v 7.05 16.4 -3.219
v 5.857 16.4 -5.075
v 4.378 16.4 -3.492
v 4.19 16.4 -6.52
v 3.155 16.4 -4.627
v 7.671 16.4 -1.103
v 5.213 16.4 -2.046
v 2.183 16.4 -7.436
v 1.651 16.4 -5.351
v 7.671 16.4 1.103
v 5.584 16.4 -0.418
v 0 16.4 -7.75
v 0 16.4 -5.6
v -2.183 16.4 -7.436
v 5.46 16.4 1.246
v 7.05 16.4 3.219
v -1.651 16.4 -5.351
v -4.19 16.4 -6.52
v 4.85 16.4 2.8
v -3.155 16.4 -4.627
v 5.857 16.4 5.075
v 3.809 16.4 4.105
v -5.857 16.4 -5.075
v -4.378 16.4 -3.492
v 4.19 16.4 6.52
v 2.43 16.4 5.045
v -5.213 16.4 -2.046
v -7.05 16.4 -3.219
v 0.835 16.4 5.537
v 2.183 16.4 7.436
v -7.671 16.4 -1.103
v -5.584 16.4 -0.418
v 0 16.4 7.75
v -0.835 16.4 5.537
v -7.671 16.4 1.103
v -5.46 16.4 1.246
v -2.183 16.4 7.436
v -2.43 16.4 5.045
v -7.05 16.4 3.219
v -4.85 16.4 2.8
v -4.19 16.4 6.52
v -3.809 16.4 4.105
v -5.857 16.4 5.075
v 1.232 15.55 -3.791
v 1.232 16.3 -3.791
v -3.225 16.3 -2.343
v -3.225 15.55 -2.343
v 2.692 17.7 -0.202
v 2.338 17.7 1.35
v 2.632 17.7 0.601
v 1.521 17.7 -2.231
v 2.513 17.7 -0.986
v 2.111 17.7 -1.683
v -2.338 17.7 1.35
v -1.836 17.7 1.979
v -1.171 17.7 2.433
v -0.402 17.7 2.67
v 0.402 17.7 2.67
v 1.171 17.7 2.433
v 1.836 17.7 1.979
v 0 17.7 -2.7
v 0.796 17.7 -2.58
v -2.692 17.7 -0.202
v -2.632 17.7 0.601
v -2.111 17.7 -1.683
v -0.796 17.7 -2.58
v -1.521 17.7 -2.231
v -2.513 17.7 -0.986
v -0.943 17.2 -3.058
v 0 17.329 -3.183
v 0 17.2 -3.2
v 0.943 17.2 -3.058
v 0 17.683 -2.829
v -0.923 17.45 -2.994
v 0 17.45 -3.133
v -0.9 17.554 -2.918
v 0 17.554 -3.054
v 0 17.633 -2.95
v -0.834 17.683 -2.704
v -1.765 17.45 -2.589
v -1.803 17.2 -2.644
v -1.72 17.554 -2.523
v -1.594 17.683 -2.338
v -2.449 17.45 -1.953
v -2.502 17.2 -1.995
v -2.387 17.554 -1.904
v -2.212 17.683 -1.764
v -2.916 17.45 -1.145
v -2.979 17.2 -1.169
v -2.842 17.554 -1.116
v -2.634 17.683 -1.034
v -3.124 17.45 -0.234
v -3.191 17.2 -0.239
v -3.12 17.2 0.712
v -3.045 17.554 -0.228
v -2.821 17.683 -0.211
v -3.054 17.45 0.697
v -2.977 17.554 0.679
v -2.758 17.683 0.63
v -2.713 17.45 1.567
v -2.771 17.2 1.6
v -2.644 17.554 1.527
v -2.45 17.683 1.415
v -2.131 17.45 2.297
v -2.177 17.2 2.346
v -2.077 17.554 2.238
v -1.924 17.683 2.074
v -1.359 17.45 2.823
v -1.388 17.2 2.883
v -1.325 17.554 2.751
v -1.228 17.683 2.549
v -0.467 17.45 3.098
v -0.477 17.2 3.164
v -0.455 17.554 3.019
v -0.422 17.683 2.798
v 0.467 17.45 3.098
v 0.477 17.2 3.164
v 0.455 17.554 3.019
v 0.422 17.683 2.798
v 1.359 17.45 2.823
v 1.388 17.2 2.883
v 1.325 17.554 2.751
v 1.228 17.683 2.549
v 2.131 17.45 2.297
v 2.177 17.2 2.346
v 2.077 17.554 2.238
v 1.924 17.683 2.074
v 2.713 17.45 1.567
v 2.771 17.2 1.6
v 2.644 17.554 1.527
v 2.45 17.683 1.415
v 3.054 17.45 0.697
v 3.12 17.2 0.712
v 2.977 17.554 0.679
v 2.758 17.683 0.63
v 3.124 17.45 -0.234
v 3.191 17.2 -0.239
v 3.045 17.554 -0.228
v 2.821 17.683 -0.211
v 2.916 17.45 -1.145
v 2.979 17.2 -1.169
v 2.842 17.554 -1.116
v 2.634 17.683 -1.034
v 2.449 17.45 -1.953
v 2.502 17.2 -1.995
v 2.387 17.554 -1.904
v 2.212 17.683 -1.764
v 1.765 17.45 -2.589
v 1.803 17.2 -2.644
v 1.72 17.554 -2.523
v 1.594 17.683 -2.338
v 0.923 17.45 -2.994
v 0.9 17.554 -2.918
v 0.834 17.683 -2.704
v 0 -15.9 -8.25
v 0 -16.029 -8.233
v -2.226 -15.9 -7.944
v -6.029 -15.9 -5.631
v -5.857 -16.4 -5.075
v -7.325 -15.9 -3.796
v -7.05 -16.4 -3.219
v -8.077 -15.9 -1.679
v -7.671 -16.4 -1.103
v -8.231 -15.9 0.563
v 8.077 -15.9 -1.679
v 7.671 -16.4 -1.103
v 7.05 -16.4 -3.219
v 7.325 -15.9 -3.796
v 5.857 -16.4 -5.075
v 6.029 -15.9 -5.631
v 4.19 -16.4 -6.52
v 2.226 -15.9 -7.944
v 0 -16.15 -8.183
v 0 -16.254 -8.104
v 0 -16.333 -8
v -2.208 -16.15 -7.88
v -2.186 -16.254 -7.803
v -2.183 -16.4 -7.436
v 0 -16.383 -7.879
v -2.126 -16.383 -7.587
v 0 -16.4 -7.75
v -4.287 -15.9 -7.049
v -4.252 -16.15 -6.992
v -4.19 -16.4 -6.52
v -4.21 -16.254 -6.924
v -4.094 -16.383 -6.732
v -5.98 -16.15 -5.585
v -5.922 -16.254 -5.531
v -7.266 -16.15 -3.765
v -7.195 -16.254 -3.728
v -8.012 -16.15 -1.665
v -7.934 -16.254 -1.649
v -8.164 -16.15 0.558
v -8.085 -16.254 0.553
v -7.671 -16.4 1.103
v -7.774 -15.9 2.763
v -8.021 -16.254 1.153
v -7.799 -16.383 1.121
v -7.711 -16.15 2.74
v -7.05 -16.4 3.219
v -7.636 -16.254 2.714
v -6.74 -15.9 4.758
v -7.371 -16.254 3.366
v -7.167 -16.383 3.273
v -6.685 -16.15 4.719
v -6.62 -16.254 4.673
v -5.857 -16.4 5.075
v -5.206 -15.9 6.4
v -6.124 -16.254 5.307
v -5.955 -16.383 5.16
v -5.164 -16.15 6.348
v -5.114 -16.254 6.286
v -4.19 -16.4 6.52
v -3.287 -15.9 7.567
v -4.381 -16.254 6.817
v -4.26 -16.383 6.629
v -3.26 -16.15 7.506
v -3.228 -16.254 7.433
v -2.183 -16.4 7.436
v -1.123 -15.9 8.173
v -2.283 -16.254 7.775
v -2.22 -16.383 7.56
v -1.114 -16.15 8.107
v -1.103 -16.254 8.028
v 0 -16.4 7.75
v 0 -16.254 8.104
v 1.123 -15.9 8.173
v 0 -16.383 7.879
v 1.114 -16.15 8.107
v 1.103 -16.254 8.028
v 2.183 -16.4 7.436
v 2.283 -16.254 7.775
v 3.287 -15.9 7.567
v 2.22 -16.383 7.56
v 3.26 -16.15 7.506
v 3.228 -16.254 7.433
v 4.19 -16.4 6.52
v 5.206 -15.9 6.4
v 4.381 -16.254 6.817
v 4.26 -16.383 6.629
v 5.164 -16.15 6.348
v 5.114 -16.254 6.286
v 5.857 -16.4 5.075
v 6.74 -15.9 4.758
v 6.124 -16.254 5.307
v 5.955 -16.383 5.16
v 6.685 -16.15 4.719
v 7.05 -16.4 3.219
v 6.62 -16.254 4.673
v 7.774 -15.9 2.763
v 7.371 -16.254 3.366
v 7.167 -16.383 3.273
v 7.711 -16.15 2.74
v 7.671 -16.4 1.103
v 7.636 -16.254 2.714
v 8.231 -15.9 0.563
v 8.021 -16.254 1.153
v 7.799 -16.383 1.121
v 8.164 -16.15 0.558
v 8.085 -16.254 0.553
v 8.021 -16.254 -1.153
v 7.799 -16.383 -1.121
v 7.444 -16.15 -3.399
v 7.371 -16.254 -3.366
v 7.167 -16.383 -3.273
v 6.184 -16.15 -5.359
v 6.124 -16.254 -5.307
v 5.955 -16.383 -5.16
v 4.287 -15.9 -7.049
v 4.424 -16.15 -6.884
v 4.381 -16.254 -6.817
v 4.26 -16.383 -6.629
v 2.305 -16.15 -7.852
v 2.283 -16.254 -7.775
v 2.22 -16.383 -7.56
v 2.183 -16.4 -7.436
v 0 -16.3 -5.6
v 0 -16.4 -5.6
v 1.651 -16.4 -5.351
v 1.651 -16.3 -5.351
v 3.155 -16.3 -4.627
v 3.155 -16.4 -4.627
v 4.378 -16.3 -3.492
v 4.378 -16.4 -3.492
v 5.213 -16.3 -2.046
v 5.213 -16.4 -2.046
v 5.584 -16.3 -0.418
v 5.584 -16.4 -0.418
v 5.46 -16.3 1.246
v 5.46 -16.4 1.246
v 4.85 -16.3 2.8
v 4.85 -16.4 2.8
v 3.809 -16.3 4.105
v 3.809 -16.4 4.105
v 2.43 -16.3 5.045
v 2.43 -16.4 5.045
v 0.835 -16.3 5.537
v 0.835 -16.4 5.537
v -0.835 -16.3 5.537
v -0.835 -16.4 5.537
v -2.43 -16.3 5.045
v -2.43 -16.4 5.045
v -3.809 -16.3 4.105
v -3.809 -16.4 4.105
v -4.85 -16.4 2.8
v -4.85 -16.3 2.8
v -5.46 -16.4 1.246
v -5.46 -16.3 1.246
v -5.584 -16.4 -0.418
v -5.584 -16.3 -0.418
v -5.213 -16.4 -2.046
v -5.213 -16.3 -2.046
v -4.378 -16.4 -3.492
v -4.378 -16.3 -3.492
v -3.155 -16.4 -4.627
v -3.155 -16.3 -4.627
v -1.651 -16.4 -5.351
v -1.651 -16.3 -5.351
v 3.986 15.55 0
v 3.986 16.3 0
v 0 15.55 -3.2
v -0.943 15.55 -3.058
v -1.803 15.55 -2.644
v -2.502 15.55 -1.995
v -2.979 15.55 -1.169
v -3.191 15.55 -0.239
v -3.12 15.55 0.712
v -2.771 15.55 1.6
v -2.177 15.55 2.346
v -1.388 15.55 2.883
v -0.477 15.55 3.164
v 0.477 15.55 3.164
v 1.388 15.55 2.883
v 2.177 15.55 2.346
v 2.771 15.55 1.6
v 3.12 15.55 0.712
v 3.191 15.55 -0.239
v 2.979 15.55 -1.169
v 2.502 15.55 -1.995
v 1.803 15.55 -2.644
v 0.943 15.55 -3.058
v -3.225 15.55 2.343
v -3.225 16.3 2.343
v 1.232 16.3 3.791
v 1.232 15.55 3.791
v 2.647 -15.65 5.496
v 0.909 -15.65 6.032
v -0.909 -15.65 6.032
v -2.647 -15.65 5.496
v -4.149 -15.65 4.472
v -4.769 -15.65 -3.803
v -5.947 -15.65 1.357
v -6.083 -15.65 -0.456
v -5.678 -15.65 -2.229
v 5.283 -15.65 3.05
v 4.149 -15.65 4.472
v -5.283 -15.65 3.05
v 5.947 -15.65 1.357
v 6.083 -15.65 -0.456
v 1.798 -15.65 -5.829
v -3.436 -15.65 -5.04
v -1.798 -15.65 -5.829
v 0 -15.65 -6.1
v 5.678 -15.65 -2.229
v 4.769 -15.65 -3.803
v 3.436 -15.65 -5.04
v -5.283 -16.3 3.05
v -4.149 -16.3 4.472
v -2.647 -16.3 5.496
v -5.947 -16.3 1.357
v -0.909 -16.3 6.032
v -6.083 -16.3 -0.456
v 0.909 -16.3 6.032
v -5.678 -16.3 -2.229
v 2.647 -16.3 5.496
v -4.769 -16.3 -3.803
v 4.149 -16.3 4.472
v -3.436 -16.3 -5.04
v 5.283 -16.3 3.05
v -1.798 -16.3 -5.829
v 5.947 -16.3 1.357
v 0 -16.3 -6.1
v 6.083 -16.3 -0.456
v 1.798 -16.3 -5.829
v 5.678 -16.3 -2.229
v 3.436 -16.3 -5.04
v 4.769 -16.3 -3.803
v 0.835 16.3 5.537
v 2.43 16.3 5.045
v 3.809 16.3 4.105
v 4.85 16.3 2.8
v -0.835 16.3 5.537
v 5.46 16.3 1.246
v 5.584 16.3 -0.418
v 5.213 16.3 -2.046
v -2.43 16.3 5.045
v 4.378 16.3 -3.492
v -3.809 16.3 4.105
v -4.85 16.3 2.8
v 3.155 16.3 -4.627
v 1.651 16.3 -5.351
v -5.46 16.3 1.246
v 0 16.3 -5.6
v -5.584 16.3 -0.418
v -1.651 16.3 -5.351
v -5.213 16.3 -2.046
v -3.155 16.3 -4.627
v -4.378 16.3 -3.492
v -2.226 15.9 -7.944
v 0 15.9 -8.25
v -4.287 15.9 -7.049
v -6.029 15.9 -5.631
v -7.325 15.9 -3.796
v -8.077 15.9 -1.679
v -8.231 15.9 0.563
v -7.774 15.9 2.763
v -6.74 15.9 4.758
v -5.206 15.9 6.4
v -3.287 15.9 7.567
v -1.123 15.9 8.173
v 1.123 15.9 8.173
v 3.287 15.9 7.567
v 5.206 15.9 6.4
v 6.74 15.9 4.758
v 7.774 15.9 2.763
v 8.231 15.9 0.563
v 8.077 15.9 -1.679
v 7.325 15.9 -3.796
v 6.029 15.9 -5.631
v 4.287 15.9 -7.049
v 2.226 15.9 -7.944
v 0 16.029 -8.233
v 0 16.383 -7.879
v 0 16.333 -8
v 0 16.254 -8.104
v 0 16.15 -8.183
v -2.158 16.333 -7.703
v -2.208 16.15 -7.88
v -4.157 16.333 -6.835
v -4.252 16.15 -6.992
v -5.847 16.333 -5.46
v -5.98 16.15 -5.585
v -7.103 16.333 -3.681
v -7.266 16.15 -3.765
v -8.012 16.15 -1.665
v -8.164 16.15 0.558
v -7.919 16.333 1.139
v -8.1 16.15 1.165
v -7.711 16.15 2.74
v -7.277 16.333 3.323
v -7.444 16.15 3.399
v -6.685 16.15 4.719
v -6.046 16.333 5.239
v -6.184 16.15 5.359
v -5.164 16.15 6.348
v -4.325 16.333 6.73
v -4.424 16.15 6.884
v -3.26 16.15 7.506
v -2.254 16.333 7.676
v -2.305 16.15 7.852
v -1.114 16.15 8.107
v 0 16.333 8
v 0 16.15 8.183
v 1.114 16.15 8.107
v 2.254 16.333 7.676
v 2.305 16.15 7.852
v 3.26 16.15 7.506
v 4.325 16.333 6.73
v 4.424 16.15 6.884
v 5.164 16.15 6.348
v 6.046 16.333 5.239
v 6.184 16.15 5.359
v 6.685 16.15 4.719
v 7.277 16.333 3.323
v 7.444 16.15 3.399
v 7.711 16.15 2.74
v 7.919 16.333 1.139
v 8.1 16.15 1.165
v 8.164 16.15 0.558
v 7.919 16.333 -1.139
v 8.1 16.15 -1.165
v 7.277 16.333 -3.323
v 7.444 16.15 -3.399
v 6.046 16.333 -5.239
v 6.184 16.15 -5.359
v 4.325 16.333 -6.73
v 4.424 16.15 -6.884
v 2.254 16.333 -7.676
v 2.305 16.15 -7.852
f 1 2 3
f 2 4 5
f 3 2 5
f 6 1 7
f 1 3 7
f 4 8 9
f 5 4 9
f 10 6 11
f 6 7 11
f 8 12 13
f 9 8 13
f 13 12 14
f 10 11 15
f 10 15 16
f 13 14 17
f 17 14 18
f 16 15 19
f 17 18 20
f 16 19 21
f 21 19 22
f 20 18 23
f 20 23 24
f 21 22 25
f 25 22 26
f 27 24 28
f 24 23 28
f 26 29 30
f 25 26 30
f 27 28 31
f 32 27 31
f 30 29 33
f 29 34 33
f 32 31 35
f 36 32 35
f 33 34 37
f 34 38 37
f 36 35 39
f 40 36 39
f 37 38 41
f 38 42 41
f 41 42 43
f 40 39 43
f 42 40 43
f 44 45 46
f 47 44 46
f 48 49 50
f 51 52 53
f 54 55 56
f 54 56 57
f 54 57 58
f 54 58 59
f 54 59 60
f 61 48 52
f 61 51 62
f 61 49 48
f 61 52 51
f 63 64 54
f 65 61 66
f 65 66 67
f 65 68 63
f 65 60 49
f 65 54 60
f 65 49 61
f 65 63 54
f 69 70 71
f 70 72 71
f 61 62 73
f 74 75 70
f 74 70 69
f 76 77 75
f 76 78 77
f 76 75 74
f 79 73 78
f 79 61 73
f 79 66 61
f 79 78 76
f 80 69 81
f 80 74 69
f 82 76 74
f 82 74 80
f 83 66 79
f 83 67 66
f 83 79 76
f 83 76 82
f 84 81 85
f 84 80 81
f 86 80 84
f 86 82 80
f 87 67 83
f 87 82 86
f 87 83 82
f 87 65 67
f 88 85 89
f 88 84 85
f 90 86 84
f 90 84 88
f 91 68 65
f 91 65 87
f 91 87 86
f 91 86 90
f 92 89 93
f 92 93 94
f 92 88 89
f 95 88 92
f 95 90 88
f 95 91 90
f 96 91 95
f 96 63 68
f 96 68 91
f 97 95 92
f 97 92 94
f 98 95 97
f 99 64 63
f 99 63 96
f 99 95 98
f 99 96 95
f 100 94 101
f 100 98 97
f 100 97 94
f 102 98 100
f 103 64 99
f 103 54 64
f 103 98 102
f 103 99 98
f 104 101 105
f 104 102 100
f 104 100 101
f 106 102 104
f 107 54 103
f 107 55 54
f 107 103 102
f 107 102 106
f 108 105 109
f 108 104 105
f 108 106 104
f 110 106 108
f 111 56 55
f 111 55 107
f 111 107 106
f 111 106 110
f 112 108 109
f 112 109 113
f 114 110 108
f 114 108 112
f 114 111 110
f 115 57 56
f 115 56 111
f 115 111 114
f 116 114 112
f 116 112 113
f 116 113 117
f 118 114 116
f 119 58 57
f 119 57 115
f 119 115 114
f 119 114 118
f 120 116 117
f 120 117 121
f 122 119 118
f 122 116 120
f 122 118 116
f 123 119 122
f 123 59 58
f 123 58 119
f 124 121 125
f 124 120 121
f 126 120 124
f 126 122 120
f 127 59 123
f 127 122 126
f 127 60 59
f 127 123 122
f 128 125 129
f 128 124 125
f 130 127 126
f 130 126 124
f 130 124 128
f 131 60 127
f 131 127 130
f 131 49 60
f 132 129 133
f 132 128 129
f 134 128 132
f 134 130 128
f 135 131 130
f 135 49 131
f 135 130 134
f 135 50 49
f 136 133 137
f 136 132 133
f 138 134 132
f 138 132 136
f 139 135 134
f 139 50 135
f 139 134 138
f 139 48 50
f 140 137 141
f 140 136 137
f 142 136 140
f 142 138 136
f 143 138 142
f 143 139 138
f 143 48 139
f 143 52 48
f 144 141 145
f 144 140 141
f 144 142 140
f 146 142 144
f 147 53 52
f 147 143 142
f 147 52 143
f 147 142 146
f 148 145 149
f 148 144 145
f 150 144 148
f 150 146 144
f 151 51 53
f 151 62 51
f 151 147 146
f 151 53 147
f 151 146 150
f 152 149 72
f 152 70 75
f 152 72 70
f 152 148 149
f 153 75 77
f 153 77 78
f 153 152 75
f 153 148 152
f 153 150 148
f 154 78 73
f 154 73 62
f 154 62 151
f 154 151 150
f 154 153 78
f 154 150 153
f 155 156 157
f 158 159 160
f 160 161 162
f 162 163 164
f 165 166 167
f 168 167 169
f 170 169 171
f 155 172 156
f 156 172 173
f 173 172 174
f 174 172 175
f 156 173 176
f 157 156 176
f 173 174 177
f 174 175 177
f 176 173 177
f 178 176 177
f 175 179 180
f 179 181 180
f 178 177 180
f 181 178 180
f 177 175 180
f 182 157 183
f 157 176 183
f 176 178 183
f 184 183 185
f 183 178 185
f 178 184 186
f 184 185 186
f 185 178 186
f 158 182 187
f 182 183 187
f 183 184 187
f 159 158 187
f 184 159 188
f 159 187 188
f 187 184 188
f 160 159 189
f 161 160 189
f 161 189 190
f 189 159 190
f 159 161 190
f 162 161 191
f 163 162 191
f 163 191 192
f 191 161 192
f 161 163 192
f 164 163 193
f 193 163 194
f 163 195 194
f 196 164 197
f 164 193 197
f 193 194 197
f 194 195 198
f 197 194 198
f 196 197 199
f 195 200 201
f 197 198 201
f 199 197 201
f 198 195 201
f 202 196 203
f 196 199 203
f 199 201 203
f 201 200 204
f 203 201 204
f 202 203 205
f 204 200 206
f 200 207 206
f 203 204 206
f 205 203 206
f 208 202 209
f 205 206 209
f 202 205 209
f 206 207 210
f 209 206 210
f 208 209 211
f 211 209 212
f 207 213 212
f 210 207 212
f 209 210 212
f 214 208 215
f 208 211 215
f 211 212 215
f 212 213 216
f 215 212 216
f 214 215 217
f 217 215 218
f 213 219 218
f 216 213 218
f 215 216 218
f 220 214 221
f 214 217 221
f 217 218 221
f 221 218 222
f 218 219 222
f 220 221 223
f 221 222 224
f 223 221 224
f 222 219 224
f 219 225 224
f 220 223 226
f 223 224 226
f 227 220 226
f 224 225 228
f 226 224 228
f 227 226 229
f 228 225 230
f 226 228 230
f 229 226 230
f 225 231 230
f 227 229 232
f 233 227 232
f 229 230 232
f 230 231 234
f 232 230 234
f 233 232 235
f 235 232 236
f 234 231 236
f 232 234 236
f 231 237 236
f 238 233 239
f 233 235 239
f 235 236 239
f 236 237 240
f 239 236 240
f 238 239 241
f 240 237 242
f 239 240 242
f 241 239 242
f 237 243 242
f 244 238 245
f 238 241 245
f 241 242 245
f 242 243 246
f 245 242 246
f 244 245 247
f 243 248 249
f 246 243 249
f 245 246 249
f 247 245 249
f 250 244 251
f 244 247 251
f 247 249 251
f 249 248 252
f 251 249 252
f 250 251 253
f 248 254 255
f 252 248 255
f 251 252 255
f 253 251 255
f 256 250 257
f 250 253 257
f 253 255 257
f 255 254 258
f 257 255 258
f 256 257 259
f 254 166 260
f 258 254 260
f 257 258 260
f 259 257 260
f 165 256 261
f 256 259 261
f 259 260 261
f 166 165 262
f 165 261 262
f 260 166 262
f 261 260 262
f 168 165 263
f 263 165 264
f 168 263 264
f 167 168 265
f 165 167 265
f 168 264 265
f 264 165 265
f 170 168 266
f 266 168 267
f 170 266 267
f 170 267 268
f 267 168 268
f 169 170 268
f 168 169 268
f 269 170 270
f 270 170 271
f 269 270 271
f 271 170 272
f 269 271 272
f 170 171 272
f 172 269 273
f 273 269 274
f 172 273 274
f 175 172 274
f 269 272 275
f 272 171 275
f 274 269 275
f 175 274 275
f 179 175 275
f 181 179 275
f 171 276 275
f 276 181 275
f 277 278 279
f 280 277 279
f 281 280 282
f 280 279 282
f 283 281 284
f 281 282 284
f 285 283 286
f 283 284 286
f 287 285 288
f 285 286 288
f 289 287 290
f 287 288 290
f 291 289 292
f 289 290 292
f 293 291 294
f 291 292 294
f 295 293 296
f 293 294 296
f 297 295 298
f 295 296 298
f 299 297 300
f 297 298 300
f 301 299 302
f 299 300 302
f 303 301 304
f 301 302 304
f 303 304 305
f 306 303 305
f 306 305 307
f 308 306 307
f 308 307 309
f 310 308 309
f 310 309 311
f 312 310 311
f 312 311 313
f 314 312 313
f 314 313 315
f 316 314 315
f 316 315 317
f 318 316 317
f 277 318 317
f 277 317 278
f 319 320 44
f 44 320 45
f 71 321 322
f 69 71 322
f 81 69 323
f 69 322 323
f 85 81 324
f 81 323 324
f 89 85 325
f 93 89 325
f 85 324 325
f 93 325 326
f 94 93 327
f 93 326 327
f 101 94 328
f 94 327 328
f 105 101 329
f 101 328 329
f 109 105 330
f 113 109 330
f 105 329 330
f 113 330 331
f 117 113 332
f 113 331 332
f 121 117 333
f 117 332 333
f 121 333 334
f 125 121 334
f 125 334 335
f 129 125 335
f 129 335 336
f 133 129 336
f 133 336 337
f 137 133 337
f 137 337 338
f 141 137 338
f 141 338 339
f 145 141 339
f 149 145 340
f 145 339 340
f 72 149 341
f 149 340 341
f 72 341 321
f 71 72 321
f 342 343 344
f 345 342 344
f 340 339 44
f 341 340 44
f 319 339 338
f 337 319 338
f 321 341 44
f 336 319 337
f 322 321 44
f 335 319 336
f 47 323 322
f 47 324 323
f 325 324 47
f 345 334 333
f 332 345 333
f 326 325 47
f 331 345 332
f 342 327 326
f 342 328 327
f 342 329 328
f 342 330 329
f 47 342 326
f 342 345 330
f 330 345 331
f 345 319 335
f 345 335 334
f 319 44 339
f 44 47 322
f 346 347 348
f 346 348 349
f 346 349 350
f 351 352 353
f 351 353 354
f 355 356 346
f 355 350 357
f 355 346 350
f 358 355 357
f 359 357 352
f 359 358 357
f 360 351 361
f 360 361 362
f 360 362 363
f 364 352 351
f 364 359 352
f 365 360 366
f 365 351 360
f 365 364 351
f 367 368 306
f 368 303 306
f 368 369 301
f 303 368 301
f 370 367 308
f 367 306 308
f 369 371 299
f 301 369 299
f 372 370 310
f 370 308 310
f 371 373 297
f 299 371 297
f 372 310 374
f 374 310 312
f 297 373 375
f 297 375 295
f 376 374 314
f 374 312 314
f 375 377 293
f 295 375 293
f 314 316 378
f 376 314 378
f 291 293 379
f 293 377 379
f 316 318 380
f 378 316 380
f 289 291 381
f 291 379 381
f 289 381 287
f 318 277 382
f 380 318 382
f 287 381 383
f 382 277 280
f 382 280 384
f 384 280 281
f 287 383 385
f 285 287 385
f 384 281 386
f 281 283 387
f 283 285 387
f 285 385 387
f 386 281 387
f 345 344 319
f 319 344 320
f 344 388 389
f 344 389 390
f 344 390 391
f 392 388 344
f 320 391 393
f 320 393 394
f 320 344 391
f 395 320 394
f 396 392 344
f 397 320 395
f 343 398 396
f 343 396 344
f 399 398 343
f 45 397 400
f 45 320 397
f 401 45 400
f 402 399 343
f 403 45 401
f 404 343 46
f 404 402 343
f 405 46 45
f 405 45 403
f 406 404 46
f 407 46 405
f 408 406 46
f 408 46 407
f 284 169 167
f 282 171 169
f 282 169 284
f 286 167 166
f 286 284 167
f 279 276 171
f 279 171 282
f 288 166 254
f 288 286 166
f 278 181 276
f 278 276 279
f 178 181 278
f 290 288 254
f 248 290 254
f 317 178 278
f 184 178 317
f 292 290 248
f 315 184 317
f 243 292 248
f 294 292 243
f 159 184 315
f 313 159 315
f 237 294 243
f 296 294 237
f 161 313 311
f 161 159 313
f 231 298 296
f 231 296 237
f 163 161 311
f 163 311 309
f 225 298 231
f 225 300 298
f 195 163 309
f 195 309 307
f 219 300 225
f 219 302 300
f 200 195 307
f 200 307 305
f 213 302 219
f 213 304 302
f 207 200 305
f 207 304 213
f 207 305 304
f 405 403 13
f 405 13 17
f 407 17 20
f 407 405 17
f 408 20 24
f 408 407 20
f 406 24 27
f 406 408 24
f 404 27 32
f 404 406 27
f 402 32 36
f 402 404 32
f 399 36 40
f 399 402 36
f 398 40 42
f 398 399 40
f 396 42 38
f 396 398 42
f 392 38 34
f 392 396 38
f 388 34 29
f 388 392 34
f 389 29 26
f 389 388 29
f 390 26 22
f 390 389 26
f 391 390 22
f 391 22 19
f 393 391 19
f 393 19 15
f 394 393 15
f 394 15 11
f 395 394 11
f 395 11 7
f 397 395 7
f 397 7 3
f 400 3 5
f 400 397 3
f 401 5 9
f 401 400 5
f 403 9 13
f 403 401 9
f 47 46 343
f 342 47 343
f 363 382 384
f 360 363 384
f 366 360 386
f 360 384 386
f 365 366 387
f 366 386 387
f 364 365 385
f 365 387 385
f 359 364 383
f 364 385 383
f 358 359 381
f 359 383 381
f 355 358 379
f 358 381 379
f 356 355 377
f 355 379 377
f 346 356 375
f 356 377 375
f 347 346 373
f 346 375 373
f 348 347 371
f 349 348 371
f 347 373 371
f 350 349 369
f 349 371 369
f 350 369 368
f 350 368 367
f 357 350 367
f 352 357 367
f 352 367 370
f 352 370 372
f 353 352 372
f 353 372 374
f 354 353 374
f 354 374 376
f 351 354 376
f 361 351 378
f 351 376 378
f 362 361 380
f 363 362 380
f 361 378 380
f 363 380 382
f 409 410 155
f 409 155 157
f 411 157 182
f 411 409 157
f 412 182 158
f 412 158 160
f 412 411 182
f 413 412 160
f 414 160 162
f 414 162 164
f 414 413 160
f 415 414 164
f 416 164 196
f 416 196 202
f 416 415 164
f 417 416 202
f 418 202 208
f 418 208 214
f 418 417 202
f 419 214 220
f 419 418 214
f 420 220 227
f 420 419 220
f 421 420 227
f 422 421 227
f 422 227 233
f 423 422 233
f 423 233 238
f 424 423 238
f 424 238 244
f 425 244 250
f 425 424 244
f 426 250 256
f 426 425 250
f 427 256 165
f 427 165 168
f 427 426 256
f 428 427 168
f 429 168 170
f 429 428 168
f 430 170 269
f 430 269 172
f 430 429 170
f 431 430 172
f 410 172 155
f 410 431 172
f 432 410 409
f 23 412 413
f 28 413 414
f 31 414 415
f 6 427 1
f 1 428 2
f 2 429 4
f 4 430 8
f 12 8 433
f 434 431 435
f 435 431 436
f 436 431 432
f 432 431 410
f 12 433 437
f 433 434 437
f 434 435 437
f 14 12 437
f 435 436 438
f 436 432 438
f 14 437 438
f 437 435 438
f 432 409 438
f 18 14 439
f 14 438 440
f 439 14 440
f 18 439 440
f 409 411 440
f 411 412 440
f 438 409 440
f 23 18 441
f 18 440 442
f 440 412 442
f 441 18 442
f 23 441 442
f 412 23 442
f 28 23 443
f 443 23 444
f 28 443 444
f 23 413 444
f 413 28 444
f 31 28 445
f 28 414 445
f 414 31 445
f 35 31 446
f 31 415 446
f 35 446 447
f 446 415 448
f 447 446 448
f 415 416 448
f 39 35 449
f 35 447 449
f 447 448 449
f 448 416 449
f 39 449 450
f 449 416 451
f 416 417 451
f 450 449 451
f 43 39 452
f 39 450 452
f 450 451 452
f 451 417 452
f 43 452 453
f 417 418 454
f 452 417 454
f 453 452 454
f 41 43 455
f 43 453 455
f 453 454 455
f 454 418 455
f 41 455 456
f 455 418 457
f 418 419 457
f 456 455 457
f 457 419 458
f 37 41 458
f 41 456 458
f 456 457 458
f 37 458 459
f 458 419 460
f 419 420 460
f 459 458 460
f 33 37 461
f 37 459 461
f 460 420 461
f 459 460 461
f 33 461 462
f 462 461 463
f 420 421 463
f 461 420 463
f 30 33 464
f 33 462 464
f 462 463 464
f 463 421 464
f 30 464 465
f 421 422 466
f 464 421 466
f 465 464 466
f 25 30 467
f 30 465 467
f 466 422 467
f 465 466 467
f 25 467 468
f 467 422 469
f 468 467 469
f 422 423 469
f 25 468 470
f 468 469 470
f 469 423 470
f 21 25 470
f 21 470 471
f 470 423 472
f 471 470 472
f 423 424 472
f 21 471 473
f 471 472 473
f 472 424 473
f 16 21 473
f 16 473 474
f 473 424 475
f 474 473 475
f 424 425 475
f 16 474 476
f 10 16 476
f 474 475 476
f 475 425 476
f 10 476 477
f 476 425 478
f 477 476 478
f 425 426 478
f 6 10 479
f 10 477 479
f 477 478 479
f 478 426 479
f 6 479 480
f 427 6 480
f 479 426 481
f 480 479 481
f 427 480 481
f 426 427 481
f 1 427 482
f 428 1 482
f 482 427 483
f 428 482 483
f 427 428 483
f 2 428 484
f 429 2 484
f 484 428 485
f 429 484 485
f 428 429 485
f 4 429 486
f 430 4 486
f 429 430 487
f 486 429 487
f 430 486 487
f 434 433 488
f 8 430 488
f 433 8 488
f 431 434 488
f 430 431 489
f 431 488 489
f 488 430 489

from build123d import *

# Parameters (mm, degrees)
SKETCH1_W           = 8.25
SKETCH1_H           = 32.8
SKETCH2_R           = 5.6
CUT_EXTRUDE1_DEPTH  = 0.75
CUT_EXTRUDE2_START  = -0.1
SKETCH3_R           = 5.6
CUT_EXTRUDE2_DEPTH  = 0.1
CUT_EXTRUDE3_DEPTH  = 0.75
SKETCH5_R           = 3.2
BOSS_EXTRUDE3_DEPTH = 2.15
FILLET1_R           = 0.5
SKETCH6_R           = 6.1
SKETCH6_R_2         = 5.6
CUT_EXTRUDE4_DEPTH  = 0.65
FILLET2_R           = 0.5


with BuildPart() as part:
    # Sketch1 → Base-Revolve (revolve)
    with BuildSketch(Plane.XY, mode=Mode.PRIVATE) as base_revolve_sk:
        with Locations((4.125, 0)):
            Rectangle(SKETCH1_W, SKETCH1_H)
    revolve(base_revolve_sk.sketch.rotate(Axis((0, -16.4, 0), (0, 1, 0)), 90), axis=Axis((0, -16.4, 0), (0, 1, 0)))

    # Sketch2 → Cut-Extrude1 (cut)
    with BuildSketch(Plane.XZ.offset(16.4)):
        with Locations(Location((0, 0, 0), (0, 0, 270))):
            Circle(SKETCH2_R)
    extrude(amount=-CUT_EXTRUDE1_DEPTH, mode=Mode.SUBTRACT)

    # Sketch3 → Cut-Extrude2 (cut)
    with BuildSketch(Plane(origin=(0, 16.4, 0), x_dir=(-1, 0, 0), z_dir=(0, 1, 0)).offset(CUT_EXTRUDE2_START)):
        with Locations(Location((0, 0, 0), (0, 0, 270))):
            Circle(SKETCH3_R)
    extrude(amount=CUT_EXTRUDE2_DEPTH, mode=Mode.SUBTRACT)

    # Sketch4 → Cut-Extrude3 (cut)
    with BuildSketch(Plane(origin=(0, 16.3, 0), x_dir=(-1, 0, 0), z_dir=(0, 1, 0))):
        Polygon((3.225, -2.343099653), (3.225, 2.343099653), (-1.231840386, 3.791214877), (-3.986319227, 0), (-1.231840386, -3.791214877), align=None)
    extrude(amount=-CUT_EXTRUDE3_DEPTH, mode=Mode.SUBTRACT)

    # Sketch5 → Boss-Extrude3 (add)
    with BuildSketch(Plane(origin=(0, 15.55, 0), x_dir=(-1, 0, 0), z_dir=(0, 1, 0))):
        with Locations(Location((0, 0, 0), (0, 0, 270))):
            Circle(SKETCH5_R)
    extrude(amount=BOSS_EXTRUDE3_DEPTH)

    # Fillet1
    fillet1_edges = [part.edges().sort_by_distance(p)[0] for p in [
        (0, 17.7, 3.2),
    ]]
    fillet(fillet1_edges, radius=FILLET1_R)

    # Sketch6 → Cut-Extrude4 (cut)
    with BuildSketch(Plane.XZ.offset(16.3)):
        with Locations(Location((0, 0, 0), (0, 0, 270))):
            Circle(SKETCH6_R)
        with Locations(Location((0, 0, 0), (0, 0, 270))):
            Circle(SKETCH6_R_2, mode=Mode.SUBTRACT)
    extrude(amount=-CUT_EXTRUDE4_DEPTH, mode=Mode.SUBTRACT)

    # Fillet2
    fillet2_edges = [part.edges().sort_by_distance(p)[0] for p in [
        (0, -16.4, 8.25),
        (0, 16.4, 8.25),
    ]]
    fillet(fillet2_edges, radius=FILLET2_R)


solid = part.part
